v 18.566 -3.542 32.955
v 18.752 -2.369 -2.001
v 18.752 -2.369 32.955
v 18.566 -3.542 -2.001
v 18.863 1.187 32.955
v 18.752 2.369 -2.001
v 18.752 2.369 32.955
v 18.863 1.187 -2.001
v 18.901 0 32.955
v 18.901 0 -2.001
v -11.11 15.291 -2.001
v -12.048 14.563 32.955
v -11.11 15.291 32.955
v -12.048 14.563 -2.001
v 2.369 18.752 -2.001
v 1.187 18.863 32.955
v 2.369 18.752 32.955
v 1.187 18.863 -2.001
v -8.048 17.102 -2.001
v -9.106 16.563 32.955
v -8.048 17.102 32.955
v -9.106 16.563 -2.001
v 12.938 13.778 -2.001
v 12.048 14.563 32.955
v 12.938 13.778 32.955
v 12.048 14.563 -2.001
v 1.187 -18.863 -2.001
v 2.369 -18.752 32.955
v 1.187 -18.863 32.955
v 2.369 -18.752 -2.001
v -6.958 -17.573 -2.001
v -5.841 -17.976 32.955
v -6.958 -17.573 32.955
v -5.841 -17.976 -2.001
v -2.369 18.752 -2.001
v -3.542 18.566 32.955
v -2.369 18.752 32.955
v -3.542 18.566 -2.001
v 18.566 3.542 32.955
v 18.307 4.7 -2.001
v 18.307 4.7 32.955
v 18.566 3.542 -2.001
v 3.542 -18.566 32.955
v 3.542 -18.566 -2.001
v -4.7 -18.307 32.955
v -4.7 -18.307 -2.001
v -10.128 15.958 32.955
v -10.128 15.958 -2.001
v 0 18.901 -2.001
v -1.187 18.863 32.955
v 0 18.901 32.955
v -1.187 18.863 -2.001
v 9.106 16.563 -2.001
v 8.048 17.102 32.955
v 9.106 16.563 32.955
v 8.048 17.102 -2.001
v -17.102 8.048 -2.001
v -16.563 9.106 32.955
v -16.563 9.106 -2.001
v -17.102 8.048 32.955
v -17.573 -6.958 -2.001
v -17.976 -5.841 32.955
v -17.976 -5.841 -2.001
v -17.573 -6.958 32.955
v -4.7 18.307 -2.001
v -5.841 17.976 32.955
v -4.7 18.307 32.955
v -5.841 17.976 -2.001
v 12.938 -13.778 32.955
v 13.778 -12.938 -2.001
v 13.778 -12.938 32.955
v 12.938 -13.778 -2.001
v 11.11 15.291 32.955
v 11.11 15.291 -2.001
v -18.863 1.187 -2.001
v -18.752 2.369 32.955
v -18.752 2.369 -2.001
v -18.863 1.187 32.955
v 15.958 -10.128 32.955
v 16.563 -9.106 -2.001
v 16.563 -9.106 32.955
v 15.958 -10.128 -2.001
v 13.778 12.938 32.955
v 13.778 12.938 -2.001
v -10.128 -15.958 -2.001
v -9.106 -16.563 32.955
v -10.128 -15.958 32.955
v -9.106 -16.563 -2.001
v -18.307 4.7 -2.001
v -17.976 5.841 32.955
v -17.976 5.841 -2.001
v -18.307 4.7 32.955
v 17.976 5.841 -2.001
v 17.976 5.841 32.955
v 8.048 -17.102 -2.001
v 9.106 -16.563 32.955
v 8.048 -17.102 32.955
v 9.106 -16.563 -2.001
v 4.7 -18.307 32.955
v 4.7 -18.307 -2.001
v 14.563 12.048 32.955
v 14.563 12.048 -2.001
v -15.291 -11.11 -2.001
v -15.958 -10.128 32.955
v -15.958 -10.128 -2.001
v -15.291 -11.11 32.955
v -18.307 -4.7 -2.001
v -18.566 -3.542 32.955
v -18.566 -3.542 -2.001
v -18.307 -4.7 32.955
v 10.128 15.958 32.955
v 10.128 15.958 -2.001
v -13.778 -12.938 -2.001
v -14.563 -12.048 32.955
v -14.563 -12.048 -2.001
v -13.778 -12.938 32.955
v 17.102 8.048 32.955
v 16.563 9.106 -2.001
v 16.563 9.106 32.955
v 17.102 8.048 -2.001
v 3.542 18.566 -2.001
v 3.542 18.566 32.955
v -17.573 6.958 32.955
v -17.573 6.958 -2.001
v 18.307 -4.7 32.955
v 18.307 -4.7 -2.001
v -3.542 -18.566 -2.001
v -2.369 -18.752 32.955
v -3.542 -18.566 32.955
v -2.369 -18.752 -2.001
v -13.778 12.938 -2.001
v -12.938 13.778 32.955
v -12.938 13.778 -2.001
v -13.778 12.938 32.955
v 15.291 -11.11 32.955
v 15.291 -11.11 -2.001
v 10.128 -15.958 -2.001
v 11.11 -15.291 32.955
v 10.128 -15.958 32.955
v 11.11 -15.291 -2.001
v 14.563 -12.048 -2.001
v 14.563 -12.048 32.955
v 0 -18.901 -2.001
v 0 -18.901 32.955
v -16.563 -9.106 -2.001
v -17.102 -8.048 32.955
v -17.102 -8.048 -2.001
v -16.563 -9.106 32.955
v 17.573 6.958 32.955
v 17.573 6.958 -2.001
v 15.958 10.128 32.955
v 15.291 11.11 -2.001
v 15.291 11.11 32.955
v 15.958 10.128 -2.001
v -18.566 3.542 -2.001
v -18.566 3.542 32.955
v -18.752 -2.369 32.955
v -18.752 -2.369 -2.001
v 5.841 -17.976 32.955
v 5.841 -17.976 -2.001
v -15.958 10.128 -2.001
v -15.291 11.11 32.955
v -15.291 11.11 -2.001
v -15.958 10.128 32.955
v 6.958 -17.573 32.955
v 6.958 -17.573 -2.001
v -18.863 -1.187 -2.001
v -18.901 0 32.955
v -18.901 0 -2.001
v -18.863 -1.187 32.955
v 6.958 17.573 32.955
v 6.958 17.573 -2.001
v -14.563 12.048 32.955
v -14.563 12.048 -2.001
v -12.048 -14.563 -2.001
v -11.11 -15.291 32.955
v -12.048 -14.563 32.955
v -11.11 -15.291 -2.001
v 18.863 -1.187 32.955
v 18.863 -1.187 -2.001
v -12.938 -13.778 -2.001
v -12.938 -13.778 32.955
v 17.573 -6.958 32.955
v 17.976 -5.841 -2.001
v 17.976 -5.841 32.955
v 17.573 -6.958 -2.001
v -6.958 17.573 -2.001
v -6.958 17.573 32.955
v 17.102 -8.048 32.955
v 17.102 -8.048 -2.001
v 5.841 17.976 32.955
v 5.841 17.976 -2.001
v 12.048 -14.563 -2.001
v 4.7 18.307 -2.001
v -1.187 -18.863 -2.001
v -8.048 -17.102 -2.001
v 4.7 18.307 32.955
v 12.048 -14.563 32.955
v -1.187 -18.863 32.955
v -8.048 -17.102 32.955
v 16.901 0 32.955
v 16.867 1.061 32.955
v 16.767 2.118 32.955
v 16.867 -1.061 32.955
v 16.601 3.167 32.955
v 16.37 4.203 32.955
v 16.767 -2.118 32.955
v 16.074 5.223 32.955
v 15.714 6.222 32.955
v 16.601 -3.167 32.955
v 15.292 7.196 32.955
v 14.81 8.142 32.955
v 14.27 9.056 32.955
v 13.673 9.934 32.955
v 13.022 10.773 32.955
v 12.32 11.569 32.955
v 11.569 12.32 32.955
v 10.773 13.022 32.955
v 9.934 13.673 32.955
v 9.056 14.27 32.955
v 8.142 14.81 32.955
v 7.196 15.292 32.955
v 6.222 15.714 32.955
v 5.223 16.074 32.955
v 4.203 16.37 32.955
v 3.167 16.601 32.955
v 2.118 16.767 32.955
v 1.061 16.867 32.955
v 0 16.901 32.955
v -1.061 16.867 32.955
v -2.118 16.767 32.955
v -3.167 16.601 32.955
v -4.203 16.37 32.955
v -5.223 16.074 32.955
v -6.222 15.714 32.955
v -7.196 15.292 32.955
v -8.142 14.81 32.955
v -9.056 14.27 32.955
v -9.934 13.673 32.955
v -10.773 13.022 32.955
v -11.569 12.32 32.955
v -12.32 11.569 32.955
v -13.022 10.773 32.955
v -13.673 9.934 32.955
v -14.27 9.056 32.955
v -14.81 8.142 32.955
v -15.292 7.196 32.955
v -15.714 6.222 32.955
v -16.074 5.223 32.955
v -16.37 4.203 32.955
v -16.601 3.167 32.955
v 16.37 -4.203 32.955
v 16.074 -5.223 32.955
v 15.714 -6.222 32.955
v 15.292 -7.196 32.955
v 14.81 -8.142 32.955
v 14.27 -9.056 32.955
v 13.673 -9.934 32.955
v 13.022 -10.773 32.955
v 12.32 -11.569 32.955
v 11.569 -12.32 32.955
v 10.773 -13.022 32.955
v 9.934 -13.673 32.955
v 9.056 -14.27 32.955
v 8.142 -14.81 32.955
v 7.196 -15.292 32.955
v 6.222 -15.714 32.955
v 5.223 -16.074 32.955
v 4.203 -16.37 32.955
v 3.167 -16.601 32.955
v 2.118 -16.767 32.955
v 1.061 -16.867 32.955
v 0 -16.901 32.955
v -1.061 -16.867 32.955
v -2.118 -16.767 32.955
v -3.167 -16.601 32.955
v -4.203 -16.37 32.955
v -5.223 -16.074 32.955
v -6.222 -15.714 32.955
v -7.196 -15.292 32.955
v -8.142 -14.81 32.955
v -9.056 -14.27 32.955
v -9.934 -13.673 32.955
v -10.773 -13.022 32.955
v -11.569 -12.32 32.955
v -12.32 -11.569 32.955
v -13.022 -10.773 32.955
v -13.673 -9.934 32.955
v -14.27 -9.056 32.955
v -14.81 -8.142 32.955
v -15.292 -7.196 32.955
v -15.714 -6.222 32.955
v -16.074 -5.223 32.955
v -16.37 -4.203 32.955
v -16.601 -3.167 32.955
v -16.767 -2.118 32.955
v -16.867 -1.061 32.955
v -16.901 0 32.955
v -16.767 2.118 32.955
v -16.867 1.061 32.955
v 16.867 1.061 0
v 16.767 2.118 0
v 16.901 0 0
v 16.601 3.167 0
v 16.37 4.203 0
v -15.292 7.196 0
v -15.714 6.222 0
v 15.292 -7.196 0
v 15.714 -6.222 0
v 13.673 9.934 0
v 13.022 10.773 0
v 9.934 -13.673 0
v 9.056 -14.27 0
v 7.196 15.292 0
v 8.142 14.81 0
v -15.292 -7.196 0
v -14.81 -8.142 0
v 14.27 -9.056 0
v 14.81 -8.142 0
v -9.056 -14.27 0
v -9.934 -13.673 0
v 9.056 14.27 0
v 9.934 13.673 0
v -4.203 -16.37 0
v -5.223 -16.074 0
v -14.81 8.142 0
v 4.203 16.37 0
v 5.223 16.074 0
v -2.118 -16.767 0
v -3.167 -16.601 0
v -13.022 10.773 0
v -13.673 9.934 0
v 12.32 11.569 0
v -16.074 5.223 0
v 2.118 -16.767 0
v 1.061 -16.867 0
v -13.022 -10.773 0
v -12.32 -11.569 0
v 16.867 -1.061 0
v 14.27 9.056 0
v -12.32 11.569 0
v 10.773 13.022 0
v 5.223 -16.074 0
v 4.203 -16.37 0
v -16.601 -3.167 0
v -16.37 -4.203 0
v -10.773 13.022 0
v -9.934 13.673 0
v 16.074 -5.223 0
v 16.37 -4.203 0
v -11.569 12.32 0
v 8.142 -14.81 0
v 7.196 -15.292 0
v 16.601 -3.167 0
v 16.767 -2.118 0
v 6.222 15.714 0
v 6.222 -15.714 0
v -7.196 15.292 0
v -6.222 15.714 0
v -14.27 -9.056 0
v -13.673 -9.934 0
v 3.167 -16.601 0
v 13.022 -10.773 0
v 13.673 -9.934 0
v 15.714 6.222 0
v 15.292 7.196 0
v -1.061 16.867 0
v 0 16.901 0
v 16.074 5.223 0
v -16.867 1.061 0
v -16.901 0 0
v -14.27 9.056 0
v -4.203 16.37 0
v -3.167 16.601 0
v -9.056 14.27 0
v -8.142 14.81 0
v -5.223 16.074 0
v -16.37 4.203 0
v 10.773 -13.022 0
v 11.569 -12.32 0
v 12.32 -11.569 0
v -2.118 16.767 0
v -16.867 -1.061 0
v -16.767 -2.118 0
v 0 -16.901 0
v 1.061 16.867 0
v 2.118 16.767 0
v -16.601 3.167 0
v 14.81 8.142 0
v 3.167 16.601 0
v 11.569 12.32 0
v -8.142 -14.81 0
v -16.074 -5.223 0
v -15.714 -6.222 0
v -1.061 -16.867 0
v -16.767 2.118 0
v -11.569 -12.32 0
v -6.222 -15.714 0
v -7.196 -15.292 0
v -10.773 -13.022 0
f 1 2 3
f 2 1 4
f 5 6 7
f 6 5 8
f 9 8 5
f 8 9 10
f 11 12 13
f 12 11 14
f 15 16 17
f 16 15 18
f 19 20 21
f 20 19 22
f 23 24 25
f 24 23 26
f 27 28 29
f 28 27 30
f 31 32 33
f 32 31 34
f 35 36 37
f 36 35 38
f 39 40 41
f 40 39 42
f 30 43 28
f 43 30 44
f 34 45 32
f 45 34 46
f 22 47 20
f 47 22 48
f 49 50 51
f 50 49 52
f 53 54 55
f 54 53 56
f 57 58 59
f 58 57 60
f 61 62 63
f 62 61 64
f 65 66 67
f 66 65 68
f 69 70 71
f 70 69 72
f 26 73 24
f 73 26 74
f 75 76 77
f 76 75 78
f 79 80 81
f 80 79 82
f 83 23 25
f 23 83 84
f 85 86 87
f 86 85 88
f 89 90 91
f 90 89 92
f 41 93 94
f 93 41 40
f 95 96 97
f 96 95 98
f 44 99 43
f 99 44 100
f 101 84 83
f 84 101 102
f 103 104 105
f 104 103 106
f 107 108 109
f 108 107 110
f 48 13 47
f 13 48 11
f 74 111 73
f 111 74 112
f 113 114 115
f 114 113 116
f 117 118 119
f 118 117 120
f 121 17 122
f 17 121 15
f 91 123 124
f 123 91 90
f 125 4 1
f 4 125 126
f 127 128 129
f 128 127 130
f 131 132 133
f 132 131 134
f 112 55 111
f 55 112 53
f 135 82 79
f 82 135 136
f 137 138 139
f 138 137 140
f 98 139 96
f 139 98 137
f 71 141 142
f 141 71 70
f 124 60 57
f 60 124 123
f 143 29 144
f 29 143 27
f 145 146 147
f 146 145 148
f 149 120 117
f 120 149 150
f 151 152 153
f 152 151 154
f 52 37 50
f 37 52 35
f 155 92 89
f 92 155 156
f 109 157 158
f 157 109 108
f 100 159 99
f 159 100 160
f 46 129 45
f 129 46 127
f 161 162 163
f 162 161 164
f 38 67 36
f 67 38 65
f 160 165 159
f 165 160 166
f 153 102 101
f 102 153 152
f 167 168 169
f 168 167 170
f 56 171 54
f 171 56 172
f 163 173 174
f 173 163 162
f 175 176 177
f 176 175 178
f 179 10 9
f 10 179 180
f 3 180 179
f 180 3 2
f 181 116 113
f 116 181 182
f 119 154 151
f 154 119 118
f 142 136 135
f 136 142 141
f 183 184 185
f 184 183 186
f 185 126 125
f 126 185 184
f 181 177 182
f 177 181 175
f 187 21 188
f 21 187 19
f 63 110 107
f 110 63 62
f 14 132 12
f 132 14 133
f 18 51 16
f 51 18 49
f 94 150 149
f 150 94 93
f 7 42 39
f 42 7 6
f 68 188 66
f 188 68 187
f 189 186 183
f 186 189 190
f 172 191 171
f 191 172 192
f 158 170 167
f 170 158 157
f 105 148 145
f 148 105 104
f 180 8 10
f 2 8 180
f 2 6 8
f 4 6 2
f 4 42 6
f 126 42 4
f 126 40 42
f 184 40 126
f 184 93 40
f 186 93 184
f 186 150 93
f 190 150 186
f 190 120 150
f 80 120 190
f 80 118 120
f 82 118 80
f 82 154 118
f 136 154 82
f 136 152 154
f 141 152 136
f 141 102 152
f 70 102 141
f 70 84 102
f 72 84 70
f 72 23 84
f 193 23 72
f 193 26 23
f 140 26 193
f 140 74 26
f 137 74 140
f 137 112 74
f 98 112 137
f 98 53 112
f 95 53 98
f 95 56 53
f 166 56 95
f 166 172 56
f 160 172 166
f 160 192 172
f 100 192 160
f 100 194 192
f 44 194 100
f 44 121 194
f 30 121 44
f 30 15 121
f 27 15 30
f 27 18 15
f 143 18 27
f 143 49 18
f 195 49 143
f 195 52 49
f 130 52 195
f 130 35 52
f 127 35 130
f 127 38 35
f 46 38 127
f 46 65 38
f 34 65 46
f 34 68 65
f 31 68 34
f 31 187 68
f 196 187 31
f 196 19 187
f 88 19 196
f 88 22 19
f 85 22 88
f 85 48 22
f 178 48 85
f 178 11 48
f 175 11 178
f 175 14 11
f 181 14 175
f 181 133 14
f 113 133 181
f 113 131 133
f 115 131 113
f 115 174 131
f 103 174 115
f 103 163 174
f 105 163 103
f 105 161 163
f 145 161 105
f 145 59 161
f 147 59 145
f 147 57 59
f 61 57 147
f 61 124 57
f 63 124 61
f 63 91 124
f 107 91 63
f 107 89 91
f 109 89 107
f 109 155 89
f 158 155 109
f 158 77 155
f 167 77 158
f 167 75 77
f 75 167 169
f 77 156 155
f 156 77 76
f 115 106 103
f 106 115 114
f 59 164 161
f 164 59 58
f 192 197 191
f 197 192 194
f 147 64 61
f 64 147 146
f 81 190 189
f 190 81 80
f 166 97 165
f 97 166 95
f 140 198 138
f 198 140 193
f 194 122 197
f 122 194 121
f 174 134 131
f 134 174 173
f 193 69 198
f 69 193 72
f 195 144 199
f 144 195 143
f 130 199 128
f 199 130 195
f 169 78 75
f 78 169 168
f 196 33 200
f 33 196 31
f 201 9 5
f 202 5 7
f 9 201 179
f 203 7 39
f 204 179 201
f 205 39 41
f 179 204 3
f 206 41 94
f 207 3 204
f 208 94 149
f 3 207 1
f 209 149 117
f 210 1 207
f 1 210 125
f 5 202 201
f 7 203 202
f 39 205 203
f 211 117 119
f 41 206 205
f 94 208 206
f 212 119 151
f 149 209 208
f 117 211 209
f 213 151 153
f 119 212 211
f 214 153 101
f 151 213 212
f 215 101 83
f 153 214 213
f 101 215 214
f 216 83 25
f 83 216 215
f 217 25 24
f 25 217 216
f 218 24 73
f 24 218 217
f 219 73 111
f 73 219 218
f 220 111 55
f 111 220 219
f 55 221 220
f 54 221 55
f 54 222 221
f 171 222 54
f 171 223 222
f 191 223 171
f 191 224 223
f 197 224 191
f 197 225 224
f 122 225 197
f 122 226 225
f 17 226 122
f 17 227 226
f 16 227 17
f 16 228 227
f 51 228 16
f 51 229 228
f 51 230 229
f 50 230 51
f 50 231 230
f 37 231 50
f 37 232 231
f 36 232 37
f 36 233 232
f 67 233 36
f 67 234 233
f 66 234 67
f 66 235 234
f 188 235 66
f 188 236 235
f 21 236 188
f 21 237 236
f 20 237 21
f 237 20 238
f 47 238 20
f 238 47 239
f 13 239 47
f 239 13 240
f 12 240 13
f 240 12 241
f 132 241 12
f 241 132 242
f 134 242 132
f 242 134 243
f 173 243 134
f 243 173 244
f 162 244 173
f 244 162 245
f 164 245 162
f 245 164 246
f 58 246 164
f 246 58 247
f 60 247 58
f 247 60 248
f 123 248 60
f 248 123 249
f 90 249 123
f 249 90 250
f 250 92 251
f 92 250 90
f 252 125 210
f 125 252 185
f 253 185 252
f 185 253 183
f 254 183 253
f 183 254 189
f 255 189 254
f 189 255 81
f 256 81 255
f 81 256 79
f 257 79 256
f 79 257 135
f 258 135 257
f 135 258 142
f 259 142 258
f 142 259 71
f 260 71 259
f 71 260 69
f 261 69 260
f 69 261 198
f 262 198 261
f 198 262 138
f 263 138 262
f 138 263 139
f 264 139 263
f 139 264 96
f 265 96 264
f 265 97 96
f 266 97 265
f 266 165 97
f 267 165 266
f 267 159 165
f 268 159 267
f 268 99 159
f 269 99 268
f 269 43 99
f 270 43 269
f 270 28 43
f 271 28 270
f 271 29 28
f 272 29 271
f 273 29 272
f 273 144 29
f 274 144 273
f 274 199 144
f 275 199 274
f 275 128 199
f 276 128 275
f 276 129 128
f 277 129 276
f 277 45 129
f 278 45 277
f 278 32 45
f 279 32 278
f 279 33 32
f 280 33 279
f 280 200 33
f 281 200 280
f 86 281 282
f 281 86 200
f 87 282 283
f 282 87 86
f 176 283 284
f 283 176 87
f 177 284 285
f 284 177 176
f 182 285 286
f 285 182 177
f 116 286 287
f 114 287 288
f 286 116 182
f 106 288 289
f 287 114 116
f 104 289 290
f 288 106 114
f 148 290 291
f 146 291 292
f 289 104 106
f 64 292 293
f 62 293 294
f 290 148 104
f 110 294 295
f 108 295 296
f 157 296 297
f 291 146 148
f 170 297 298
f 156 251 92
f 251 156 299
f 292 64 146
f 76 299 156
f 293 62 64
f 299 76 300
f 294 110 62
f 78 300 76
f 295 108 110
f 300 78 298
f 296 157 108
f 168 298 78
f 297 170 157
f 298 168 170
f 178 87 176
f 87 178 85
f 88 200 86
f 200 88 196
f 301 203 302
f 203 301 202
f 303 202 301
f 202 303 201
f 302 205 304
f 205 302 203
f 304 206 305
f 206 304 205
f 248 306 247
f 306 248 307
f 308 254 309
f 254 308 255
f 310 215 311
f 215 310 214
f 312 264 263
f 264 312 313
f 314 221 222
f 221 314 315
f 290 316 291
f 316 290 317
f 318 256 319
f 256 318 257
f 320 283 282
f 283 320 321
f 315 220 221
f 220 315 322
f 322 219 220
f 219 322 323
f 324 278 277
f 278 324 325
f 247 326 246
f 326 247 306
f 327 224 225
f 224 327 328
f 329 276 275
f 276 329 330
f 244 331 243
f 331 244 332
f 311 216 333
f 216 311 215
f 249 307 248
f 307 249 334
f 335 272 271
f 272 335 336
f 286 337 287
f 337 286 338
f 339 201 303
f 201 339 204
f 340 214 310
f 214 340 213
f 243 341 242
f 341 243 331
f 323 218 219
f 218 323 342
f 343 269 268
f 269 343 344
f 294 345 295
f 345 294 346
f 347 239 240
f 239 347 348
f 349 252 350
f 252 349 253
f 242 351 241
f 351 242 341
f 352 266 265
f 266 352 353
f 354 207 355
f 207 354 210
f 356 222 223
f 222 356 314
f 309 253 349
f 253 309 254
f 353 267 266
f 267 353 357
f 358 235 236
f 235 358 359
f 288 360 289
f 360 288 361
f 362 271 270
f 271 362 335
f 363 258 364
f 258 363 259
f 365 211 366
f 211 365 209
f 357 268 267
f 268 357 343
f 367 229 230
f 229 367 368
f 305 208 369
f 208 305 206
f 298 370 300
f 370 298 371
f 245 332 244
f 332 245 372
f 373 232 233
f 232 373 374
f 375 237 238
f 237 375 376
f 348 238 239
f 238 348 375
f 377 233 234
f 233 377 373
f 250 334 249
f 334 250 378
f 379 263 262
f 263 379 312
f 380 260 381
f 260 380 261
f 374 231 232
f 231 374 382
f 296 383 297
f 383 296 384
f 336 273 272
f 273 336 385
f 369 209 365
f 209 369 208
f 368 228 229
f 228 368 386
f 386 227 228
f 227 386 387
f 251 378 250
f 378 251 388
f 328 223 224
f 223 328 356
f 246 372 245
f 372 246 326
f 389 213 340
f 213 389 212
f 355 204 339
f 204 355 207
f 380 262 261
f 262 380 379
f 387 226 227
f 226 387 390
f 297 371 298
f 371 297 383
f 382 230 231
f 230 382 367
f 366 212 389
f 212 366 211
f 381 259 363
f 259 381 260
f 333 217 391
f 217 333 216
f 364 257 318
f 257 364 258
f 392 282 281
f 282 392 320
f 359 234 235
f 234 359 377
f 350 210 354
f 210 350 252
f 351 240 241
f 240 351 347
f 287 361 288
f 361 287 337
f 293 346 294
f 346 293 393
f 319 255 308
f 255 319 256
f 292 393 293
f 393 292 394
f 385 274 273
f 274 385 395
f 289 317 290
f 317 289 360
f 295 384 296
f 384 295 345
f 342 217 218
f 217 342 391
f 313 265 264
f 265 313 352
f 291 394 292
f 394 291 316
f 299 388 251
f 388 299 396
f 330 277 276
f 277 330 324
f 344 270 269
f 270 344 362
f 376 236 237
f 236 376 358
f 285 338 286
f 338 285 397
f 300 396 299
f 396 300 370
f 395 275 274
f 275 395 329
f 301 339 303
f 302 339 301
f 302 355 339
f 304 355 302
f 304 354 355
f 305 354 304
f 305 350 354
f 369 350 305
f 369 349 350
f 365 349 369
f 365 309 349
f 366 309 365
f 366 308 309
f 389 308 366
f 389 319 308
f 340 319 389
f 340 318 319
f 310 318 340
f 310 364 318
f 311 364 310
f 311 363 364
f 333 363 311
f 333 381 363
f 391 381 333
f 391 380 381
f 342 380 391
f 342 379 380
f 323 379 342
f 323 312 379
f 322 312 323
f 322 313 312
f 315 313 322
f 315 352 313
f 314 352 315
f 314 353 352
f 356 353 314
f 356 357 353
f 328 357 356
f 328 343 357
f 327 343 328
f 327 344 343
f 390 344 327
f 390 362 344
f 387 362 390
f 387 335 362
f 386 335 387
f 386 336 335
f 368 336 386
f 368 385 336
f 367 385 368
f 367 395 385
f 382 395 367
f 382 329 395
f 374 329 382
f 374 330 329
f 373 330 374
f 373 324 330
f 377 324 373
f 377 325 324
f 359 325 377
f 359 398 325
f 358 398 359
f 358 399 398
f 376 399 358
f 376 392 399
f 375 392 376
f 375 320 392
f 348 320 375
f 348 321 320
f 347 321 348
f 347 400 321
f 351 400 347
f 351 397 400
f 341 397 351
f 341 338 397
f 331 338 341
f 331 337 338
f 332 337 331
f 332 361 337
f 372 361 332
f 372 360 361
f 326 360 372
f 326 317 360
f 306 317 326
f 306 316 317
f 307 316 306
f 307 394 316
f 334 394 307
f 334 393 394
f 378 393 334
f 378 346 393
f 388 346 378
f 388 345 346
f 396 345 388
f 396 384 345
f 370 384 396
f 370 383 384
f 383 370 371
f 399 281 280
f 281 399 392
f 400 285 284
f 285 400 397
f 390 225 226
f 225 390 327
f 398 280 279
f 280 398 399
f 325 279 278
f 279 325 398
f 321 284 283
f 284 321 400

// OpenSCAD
// description: A parametric measuring cup.
// author: Buck Clay  (clayb.rpi@gmail.com)
// date: 2010-11-17
// units: mm

/***********************
 * universal constants *
 ***********************/
MM3_PER_CUP = 236588.236;
PI = 3.14159265;

/**
 * @param cups the number of US cups this should hold
 * @param heightRatio the 'fatness' of this cup
 * @param thickness how thick (in mm) the cup should be
 */
module measuringCup(cups, heightRatio=1.5, thickness=2) {
  assign(r = pow((cups * MM3_PER_CUP) / (PI * heightRatio), 1/3)) {
    difference() {
      translate([0, 0, -thickness - 0.001])
          cylinder(r=r + thickness, h=r * heightRatio + thickness);
      cylinder(r=r, h=r * heightRatio);
    }
  }
}

$fn=100;
measuringCup(cups=1/8, heightRatio=1.95);
